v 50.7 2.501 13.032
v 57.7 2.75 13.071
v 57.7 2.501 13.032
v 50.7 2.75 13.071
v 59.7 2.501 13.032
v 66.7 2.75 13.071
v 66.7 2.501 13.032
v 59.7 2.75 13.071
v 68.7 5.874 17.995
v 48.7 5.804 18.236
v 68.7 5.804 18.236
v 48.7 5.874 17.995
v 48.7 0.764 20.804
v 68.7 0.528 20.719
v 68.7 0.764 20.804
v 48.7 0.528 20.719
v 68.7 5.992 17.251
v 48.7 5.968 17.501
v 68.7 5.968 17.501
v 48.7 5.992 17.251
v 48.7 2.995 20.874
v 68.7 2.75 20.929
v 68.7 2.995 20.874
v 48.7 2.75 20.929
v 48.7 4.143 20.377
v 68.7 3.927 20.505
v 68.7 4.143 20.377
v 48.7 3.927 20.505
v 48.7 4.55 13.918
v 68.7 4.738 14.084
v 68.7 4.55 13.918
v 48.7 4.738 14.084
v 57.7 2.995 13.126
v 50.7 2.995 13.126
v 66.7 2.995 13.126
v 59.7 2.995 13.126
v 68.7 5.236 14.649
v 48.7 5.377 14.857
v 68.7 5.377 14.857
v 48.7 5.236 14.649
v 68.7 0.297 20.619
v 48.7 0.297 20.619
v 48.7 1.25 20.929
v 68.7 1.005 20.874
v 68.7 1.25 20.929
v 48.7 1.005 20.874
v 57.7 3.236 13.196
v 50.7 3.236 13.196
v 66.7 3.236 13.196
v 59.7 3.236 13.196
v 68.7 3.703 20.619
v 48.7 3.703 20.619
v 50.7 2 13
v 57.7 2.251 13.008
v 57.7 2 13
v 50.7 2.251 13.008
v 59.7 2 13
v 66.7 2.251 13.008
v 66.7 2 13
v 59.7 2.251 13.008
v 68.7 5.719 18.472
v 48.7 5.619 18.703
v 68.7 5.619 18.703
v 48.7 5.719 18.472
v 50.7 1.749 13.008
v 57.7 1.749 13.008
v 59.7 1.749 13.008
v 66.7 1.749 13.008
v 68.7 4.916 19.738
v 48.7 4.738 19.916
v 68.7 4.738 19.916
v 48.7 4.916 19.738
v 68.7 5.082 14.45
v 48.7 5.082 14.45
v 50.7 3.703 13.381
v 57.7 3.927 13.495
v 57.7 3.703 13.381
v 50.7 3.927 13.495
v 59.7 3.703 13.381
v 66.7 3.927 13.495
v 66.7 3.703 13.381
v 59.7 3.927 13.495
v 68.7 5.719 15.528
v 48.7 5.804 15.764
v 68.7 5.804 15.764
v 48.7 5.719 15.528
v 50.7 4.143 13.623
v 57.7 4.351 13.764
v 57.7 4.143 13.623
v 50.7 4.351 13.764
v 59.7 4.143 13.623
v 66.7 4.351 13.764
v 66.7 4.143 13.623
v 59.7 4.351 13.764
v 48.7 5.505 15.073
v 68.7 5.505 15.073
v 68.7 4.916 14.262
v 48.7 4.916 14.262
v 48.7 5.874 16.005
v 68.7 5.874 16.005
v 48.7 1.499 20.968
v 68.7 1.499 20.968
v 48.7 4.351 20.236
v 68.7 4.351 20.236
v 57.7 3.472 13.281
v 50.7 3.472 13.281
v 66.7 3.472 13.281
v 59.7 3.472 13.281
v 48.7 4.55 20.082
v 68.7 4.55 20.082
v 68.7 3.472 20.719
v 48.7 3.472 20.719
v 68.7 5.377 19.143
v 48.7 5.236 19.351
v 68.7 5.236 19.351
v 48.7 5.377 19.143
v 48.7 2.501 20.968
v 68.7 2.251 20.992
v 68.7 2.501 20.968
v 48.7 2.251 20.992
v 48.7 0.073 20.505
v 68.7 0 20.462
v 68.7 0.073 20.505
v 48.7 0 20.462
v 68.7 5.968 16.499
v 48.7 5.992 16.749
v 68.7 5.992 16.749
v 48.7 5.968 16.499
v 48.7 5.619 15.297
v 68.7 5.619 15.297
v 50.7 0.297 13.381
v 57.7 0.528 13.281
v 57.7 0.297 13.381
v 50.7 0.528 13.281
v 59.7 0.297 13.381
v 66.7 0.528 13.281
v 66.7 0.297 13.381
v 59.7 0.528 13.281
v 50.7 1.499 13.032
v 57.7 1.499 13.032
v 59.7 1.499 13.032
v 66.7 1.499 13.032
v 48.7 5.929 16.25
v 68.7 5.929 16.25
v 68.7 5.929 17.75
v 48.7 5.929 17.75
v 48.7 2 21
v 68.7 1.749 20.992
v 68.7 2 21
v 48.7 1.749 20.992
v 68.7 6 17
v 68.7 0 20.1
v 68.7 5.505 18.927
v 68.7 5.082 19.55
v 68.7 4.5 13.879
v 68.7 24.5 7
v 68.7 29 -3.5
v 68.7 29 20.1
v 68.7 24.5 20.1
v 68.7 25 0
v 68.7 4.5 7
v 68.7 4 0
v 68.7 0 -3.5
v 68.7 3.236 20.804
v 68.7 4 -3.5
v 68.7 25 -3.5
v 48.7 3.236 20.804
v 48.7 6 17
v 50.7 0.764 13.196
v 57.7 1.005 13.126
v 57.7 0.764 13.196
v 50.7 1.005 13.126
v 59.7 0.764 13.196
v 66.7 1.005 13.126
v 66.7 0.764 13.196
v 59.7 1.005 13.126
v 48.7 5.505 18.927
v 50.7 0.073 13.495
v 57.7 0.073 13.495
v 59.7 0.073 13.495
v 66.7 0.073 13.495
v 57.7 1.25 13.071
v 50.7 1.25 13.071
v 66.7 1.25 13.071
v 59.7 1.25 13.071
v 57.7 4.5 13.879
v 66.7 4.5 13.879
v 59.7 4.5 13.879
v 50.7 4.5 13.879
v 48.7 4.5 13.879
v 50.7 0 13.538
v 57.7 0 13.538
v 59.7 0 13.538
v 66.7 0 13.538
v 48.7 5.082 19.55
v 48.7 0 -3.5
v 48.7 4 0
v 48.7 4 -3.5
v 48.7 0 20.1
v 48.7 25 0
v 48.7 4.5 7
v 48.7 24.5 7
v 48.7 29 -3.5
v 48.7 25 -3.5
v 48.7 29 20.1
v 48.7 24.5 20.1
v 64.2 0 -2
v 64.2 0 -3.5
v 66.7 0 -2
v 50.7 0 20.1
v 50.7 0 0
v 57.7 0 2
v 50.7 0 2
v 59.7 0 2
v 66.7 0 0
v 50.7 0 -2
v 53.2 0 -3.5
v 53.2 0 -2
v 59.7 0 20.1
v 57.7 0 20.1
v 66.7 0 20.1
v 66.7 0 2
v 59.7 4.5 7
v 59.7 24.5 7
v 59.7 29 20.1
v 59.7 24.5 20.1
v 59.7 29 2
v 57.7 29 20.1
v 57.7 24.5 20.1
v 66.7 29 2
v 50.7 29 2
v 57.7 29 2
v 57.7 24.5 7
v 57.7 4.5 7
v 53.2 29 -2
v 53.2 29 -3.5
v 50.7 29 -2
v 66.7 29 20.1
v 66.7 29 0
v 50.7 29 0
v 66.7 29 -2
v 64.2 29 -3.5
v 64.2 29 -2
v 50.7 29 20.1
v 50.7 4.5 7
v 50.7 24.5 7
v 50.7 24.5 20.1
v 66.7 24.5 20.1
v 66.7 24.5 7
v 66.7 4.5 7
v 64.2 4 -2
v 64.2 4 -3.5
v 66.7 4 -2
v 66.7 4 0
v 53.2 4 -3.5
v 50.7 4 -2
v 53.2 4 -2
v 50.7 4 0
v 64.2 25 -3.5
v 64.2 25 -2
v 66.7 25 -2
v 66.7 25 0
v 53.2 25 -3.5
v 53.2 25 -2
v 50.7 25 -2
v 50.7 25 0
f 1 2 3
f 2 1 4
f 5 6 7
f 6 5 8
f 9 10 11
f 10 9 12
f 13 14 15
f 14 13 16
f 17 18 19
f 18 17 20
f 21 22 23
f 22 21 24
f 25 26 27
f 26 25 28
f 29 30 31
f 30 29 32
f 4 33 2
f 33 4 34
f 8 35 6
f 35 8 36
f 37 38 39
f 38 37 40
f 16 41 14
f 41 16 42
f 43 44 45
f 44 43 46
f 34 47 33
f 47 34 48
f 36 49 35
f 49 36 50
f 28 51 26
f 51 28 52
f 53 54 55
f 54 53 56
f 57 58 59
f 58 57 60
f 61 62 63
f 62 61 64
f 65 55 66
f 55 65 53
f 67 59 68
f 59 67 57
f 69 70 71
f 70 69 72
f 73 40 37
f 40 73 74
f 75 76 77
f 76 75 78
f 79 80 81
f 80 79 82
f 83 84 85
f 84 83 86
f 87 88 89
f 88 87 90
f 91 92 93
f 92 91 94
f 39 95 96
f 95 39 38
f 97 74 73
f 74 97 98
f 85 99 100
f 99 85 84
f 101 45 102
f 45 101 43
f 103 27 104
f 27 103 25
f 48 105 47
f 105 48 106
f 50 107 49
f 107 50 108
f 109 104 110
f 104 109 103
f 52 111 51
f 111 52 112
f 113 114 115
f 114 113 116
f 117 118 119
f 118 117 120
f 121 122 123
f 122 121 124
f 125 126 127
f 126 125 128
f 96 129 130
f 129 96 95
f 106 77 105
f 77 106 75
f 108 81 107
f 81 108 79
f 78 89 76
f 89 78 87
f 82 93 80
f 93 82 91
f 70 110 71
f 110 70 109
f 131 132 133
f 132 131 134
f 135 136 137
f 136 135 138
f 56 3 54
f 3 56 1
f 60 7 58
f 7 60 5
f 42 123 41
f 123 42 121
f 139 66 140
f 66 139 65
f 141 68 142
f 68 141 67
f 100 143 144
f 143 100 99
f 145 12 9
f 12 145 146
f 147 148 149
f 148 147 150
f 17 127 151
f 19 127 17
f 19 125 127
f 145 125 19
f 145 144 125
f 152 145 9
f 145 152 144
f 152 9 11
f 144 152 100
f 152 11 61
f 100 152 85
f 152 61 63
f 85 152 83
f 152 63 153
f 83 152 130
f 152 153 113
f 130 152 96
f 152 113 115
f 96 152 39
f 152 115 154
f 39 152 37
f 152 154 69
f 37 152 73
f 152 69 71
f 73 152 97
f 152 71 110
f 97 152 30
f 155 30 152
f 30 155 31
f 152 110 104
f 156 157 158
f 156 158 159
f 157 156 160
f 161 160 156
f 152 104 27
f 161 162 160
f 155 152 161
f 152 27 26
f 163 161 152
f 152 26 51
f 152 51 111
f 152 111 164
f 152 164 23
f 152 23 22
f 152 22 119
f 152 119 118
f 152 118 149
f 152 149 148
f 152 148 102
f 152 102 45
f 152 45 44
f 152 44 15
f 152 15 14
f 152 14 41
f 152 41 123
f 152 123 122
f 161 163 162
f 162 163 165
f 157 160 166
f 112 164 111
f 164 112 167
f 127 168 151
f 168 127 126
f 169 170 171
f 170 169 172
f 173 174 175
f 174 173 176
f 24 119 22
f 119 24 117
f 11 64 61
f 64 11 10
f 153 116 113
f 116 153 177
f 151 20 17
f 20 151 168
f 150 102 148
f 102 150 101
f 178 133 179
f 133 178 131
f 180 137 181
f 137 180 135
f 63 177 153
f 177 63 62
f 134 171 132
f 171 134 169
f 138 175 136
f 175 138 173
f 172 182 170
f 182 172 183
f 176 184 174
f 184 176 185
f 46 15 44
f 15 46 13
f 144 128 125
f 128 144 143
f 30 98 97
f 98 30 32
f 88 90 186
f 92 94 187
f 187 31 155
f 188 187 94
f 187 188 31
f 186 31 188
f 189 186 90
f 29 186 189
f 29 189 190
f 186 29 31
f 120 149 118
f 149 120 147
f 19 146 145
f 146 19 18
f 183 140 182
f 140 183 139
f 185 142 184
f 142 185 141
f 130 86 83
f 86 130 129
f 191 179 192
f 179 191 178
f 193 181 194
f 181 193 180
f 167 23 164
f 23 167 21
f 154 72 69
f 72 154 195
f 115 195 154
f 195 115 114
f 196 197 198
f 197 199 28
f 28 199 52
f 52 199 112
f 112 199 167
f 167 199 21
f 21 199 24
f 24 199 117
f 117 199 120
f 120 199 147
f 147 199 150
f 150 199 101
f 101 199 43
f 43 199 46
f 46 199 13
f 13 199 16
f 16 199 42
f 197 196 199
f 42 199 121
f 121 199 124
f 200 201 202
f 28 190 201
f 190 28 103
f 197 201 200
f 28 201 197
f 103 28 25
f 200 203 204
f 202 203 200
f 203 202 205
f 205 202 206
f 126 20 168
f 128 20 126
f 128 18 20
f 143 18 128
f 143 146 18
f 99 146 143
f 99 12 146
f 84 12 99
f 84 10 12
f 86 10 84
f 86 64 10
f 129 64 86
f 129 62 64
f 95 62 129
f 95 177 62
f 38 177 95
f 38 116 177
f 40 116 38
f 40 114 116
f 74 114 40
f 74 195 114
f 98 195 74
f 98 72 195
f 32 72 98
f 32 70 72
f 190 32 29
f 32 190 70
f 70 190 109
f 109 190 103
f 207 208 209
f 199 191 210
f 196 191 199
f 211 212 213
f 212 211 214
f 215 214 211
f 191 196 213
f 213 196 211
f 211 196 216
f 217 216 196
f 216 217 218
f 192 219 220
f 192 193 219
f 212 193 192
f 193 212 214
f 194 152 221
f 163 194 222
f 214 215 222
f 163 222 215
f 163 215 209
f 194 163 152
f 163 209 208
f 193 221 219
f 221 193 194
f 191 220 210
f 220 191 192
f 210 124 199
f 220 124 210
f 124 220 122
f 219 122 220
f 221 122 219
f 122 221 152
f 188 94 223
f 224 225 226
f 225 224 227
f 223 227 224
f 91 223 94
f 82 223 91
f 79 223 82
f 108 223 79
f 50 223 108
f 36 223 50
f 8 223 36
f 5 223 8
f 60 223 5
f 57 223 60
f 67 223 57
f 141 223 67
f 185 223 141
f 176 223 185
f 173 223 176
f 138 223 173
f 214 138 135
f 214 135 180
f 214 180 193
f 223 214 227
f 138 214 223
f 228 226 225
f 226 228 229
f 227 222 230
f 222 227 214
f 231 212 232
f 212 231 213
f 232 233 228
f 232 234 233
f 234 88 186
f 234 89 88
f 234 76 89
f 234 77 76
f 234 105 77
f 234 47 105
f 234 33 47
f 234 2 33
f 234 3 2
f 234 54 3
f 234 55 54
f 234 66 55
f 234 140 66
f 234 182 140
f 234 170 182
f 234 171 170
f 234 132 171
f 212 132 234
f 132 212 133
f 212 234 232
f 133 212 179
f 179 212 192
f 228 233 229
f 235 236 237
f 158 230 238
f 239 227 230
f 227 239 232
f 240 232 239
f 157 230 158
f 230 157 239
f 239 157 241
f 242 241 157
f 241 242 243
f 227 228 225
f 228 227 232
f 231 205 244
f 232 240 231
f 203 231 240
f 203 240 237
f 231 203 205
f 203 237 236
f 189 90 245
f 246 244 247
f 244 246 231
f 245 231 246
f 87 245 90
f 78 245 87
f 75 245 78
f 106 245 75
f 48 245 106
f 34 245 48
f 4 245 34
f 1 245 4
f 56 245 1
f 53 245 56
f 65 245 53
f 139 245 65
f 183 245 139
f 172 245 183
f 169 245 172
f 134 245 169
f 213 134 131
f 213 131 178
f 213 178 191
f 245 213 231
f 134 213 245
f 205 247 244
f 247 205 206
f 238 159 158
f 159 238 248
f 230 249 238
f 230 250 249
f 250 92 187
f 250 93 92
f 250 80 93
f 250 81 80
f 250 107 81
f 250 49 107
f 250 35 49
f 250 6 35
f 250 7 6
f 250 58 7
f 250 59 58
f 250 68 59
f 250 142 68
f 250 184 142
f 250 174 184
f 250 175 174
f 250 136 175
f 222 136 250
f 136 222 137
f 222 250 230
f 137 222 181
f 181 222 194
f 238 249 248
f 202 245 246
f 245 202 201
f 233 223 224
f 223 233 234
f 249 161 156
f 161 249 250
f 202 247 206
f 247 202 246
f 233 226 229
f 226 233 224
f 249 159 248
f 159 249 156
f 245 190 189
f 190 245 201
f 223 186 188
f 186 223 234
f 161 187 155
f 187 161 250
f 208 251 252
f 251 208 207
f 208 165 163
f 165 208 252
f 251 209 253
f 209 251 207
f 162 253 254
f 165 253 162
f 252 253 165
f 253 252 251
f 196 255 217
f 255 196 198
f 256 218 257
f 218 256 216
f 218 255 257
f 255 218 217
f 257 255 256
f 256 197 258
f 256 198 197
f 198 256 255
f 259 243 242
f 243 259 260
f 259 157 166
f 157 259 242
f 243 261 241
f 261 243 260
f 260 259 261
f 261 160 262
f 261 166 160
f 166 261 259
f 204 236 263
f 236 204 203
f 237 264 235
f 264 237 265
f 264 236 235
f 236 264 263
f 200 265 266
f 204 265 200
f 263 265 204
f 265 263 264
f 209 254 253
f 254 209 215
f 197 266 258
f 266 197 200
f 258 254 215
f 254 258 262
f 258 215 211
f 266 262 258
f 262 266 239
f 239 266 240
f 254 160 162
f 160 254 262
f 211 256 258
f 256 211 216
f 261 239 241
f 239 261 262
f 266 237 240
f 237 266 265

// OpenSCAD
// modified by www.DIY3Dtech.com
// original design https://www.thingiverse.com/thing:426872
//
// The outer width (from left to right without buttons) of the phone or bumper in millimeters
width = 58.7;
// The outer length (from top to bottom without buttons) of the phone or bumper in millimeters
length = 124.1;
// The outer height (from backside to front side) of the phone or bumper in millimeters
height = 7.9;
// The width of the bridges from top to bottom and from left to right in millimeters. Lower values save material, higher values make the mount more stable. 15 millimeter is a good choice.
bridgewidth = 15;
// The radius of the corners of the phone or bumper. The standard Apple bumper for iPhone 5 has a corner radius of 10 millimeter.
cornerradius = 10;
// The distance bwtween the iPhone holder and the maker rai in millimeter. The current value of 15 should for most applications
mountheight = 15;
// The size of the rail where to mount the vib-holder in millimeters.
tubediameter = 20;
// The fininess of the cylinders. 100 is a good start.
$fn = 100;

module connector(stegwidth) {
	// plates
	translate([-stegwidth/2-2.5,-stegwidth/2-4.5,2]) cube([4.5,4,1.5]);
	translate([stegwidth/2-2,-stegwidth/2-4.5,2]) cube([4.5,4,1.5]);
	translate([-stegwidth/2-2.5,stegwidth/2+5.5,2]) cube([4.5,4,1.5]);
	translate([stegwidth/2-2,stegwidth/2+5.5,2]) cube([4.5,4,1.5]);
	// pins
	translate([-stegwidth/2-2.5,-stegwidth/2-4.5,0]) cube([2,4,2]);
	translate([stegwidth/2+0.5,-stegwidth/2-4.5,0]) cube([2,4,2]);
	translate([-stegwidth/2-2.5,stegwidth/2+5.5,0]) cube([2,4,2]);
	translate([stegwidth/2+0.5,stegwidth/2+5.5,0]) cube([2,4,2]);
}

module connectorcutout(stegwidth) {
		translate([-stegwidth/2-0.1,-stegwidth/2-5,1.5]) cube([3.1,5,1.6]);
		translate([stegwidth/2-3,-stegwidth/2-5,1.5]) cube([3.1,5,1.6]);
		translate([-stegwidth/2-0.1,stegwidth/2+5,1.5]) cube([3.1,5,1.6]);
		translate([stegwidth/2-3,stegwidth/2+5,1.5]) cube([3.1,5,1.6]);
		translate([-stegwidth/2-0.1,-stegwidth/2-10.1,-0.1]) cube([3.1,5.2,3.2]);
		translate([stegwidth/2-3,-stegwidth/2-10.1,-0.1]) cube([3.1,5.2,3.2]);
		translate([-stegwidth/2-0.1,stegwidth/2-0.1,-0.1]) cube([3.1,5.2,3.2]);
		translate([stegwidth/2-3,stegwidth/2-0.1,-0.1]) cube([3.1,5.2,3.2]);
}

module case(width, height, depth, radius, stegwidth) {
	difference() {
		// Outer hull
		hull() {
			translate([-width/2+radius, -height/2+radius, 0]) cylinder(r=radius+2, h=depth+4);
			translate([-width/2+radius, +height/2-radius, 0]) cylinder(r=radius+2, h=depth+4);
			translate([+width/2-radius, -height/2+radius, 0]) cylinder(r=radius+2, h=depth+4);
			translate([+width/2-radius, +height/2-radius, 0]) cylinder(r=radius+2, h=depth+4);
		}
		// substract iPhone itself
		hull() {
			translate([-width/2+radius, -height/2+radius, 3]) cylinder(r=radius, h=depth);
			translate([-width/2+radius, +height/2-radius, 3]) cylinder(r=radius, h=depth);
			translate([+width/2-radius, -height/2+radius, 3]) cylinder(r=radius, h=depth);
			translate([+width/2-radius, +height/2-radius, 3]) cylinder(r=radius, h=depth);
		}
		// display
		hull() {
			translate([-width/2+radius+1, -height/2+radius+1, depth+2.9]) cylinder(r=radius, h=1.2);
			translate([-width/2+radius+1, +height/2-radius-1, depth+2.9]) cylinder(r=radius, h=1.2);
			translate([+width/2-radius-1, -height/2+radius+1, depth+2.9]) cylinder(r=radius, h=1.2);
			translate([+width/2-radius-1, +height/2-radius-1, depth+2.9]) cylinder(r=radius, h=1.2);
		}
		// left and right pins
		translate([-width/2,-stegwidth/2-0.1,depth+2.9]) cube([width,stegwidth+0.2,1.2]);
		// upper left corner
		translate([-width/2-2.1, +stegwidth/2, -0.1]) cube([width/2-stegwidth/2+2.1,height/2-2.9,depth+4.2]);
		// upper right corner
		translate([+stegwidth/2, +stegwidth/2, -0.1]) cube([width/2-stegwidth/2+2.1,height/2-2.9,depth+4.2]);
		// lower left cut
		translate([-width/2-2.1, -height/2+radius, -0.1]) cube([width/2-stegwidth/2+2.1,height/2-stegwidth/2-radius,depth+4.2]);
		// lower right cut
		translate([+stegwidth/2, -height/2+radius, -0.1]) cube([width/2-stegwidth/2+2.1,height/2-stegwidth/2-radius,depth+4.2]);
		// lower connectors cut
		translate([-width/2+radius, -height/2-2.1, 3]) cube([width-radius-radius,3.2,depth+4.2]);
		// vertical connector cutouts
		connectorcutout(stegwidth);
		// horizontal connector cutouts
		rotate([0, 0, -90]) connectorcutout(stegwidth);
	}
	// Schnippel zum losmachen
	translate([-stegwidth/2,height/2,depth+3]) cube([stegwidth,2,3]);
}

module holder(height, radius, stegwidth) {
	// upper plate
	translate([-stegwidth/2-2.5,-stegwidth/2-7,0]) cube([stegwidth+5,stegwidth+14,2]);
    
    difference(){
        translate([-stegwidth/2-2.5,-radius-2.5,radius-3+10]) rotate([0,90,0]) 
        cylinder(d=8,h=20);
        
        translate([-15,-44.5,0])
        cube([30,30,30]);
    }
    
	// ring
	difference() {
		union() {
			//translate([-stegwidth/2-2.5,0,radius+height]) rotate([0,90,0]) cylinder(r=radius+2,h=stegwidth+5);
			// vertikale Stege
			translate([-1, -stegwidth/2-7, 2]) cube([2,stegwidth+14,radius-1.9+10]);
			translate([-stegwidth/2-2.5, -stegwidth/2-7, 2]) cube([2,stegwidth+14,radius-1.9+10]);
		  	translate([stegwidth/2+0.5, -stegwidth/2-7, 2]) cube([2,stegwidth+14,radius-1.9+10]);
		}
		//modifed section
         translate([-stegwidth/2-3.5,-radius,radius-3]) rotate([0,0,0]) cube([(radius*2)+2,radius*2,stegwidth+7.2]);
        
		// lower ring cut
		//translate([-stegwidth/2-2.6, -radius-2.1, radius+height+4]) cube([stegwidth+5.2,radius*2+4.2,radius+4]);
	}
	// connector
	translate([0,-2.5,0]) rotate([0, 180, 0]) connector(stegwidth);
}

//case(width, length, height, cornerradius, bridgewidth);

//rotate([90,0,0]) 
translate([width, tubediameter/2+2 > 14.5 ? tubediameter/2+2 : 14.5, 0]) 
holder(mountheight, tubediameter/2, bridgewidth);
//rotate([180,0,90]) translate([0, 2, 0]) holder(mountheight, tubediameter/2, bridgewidth);
//rotate([90,0,0]) translate([width, 14.5, 0]) holder(mountheight, tubediameter/2, bridgewidth);
